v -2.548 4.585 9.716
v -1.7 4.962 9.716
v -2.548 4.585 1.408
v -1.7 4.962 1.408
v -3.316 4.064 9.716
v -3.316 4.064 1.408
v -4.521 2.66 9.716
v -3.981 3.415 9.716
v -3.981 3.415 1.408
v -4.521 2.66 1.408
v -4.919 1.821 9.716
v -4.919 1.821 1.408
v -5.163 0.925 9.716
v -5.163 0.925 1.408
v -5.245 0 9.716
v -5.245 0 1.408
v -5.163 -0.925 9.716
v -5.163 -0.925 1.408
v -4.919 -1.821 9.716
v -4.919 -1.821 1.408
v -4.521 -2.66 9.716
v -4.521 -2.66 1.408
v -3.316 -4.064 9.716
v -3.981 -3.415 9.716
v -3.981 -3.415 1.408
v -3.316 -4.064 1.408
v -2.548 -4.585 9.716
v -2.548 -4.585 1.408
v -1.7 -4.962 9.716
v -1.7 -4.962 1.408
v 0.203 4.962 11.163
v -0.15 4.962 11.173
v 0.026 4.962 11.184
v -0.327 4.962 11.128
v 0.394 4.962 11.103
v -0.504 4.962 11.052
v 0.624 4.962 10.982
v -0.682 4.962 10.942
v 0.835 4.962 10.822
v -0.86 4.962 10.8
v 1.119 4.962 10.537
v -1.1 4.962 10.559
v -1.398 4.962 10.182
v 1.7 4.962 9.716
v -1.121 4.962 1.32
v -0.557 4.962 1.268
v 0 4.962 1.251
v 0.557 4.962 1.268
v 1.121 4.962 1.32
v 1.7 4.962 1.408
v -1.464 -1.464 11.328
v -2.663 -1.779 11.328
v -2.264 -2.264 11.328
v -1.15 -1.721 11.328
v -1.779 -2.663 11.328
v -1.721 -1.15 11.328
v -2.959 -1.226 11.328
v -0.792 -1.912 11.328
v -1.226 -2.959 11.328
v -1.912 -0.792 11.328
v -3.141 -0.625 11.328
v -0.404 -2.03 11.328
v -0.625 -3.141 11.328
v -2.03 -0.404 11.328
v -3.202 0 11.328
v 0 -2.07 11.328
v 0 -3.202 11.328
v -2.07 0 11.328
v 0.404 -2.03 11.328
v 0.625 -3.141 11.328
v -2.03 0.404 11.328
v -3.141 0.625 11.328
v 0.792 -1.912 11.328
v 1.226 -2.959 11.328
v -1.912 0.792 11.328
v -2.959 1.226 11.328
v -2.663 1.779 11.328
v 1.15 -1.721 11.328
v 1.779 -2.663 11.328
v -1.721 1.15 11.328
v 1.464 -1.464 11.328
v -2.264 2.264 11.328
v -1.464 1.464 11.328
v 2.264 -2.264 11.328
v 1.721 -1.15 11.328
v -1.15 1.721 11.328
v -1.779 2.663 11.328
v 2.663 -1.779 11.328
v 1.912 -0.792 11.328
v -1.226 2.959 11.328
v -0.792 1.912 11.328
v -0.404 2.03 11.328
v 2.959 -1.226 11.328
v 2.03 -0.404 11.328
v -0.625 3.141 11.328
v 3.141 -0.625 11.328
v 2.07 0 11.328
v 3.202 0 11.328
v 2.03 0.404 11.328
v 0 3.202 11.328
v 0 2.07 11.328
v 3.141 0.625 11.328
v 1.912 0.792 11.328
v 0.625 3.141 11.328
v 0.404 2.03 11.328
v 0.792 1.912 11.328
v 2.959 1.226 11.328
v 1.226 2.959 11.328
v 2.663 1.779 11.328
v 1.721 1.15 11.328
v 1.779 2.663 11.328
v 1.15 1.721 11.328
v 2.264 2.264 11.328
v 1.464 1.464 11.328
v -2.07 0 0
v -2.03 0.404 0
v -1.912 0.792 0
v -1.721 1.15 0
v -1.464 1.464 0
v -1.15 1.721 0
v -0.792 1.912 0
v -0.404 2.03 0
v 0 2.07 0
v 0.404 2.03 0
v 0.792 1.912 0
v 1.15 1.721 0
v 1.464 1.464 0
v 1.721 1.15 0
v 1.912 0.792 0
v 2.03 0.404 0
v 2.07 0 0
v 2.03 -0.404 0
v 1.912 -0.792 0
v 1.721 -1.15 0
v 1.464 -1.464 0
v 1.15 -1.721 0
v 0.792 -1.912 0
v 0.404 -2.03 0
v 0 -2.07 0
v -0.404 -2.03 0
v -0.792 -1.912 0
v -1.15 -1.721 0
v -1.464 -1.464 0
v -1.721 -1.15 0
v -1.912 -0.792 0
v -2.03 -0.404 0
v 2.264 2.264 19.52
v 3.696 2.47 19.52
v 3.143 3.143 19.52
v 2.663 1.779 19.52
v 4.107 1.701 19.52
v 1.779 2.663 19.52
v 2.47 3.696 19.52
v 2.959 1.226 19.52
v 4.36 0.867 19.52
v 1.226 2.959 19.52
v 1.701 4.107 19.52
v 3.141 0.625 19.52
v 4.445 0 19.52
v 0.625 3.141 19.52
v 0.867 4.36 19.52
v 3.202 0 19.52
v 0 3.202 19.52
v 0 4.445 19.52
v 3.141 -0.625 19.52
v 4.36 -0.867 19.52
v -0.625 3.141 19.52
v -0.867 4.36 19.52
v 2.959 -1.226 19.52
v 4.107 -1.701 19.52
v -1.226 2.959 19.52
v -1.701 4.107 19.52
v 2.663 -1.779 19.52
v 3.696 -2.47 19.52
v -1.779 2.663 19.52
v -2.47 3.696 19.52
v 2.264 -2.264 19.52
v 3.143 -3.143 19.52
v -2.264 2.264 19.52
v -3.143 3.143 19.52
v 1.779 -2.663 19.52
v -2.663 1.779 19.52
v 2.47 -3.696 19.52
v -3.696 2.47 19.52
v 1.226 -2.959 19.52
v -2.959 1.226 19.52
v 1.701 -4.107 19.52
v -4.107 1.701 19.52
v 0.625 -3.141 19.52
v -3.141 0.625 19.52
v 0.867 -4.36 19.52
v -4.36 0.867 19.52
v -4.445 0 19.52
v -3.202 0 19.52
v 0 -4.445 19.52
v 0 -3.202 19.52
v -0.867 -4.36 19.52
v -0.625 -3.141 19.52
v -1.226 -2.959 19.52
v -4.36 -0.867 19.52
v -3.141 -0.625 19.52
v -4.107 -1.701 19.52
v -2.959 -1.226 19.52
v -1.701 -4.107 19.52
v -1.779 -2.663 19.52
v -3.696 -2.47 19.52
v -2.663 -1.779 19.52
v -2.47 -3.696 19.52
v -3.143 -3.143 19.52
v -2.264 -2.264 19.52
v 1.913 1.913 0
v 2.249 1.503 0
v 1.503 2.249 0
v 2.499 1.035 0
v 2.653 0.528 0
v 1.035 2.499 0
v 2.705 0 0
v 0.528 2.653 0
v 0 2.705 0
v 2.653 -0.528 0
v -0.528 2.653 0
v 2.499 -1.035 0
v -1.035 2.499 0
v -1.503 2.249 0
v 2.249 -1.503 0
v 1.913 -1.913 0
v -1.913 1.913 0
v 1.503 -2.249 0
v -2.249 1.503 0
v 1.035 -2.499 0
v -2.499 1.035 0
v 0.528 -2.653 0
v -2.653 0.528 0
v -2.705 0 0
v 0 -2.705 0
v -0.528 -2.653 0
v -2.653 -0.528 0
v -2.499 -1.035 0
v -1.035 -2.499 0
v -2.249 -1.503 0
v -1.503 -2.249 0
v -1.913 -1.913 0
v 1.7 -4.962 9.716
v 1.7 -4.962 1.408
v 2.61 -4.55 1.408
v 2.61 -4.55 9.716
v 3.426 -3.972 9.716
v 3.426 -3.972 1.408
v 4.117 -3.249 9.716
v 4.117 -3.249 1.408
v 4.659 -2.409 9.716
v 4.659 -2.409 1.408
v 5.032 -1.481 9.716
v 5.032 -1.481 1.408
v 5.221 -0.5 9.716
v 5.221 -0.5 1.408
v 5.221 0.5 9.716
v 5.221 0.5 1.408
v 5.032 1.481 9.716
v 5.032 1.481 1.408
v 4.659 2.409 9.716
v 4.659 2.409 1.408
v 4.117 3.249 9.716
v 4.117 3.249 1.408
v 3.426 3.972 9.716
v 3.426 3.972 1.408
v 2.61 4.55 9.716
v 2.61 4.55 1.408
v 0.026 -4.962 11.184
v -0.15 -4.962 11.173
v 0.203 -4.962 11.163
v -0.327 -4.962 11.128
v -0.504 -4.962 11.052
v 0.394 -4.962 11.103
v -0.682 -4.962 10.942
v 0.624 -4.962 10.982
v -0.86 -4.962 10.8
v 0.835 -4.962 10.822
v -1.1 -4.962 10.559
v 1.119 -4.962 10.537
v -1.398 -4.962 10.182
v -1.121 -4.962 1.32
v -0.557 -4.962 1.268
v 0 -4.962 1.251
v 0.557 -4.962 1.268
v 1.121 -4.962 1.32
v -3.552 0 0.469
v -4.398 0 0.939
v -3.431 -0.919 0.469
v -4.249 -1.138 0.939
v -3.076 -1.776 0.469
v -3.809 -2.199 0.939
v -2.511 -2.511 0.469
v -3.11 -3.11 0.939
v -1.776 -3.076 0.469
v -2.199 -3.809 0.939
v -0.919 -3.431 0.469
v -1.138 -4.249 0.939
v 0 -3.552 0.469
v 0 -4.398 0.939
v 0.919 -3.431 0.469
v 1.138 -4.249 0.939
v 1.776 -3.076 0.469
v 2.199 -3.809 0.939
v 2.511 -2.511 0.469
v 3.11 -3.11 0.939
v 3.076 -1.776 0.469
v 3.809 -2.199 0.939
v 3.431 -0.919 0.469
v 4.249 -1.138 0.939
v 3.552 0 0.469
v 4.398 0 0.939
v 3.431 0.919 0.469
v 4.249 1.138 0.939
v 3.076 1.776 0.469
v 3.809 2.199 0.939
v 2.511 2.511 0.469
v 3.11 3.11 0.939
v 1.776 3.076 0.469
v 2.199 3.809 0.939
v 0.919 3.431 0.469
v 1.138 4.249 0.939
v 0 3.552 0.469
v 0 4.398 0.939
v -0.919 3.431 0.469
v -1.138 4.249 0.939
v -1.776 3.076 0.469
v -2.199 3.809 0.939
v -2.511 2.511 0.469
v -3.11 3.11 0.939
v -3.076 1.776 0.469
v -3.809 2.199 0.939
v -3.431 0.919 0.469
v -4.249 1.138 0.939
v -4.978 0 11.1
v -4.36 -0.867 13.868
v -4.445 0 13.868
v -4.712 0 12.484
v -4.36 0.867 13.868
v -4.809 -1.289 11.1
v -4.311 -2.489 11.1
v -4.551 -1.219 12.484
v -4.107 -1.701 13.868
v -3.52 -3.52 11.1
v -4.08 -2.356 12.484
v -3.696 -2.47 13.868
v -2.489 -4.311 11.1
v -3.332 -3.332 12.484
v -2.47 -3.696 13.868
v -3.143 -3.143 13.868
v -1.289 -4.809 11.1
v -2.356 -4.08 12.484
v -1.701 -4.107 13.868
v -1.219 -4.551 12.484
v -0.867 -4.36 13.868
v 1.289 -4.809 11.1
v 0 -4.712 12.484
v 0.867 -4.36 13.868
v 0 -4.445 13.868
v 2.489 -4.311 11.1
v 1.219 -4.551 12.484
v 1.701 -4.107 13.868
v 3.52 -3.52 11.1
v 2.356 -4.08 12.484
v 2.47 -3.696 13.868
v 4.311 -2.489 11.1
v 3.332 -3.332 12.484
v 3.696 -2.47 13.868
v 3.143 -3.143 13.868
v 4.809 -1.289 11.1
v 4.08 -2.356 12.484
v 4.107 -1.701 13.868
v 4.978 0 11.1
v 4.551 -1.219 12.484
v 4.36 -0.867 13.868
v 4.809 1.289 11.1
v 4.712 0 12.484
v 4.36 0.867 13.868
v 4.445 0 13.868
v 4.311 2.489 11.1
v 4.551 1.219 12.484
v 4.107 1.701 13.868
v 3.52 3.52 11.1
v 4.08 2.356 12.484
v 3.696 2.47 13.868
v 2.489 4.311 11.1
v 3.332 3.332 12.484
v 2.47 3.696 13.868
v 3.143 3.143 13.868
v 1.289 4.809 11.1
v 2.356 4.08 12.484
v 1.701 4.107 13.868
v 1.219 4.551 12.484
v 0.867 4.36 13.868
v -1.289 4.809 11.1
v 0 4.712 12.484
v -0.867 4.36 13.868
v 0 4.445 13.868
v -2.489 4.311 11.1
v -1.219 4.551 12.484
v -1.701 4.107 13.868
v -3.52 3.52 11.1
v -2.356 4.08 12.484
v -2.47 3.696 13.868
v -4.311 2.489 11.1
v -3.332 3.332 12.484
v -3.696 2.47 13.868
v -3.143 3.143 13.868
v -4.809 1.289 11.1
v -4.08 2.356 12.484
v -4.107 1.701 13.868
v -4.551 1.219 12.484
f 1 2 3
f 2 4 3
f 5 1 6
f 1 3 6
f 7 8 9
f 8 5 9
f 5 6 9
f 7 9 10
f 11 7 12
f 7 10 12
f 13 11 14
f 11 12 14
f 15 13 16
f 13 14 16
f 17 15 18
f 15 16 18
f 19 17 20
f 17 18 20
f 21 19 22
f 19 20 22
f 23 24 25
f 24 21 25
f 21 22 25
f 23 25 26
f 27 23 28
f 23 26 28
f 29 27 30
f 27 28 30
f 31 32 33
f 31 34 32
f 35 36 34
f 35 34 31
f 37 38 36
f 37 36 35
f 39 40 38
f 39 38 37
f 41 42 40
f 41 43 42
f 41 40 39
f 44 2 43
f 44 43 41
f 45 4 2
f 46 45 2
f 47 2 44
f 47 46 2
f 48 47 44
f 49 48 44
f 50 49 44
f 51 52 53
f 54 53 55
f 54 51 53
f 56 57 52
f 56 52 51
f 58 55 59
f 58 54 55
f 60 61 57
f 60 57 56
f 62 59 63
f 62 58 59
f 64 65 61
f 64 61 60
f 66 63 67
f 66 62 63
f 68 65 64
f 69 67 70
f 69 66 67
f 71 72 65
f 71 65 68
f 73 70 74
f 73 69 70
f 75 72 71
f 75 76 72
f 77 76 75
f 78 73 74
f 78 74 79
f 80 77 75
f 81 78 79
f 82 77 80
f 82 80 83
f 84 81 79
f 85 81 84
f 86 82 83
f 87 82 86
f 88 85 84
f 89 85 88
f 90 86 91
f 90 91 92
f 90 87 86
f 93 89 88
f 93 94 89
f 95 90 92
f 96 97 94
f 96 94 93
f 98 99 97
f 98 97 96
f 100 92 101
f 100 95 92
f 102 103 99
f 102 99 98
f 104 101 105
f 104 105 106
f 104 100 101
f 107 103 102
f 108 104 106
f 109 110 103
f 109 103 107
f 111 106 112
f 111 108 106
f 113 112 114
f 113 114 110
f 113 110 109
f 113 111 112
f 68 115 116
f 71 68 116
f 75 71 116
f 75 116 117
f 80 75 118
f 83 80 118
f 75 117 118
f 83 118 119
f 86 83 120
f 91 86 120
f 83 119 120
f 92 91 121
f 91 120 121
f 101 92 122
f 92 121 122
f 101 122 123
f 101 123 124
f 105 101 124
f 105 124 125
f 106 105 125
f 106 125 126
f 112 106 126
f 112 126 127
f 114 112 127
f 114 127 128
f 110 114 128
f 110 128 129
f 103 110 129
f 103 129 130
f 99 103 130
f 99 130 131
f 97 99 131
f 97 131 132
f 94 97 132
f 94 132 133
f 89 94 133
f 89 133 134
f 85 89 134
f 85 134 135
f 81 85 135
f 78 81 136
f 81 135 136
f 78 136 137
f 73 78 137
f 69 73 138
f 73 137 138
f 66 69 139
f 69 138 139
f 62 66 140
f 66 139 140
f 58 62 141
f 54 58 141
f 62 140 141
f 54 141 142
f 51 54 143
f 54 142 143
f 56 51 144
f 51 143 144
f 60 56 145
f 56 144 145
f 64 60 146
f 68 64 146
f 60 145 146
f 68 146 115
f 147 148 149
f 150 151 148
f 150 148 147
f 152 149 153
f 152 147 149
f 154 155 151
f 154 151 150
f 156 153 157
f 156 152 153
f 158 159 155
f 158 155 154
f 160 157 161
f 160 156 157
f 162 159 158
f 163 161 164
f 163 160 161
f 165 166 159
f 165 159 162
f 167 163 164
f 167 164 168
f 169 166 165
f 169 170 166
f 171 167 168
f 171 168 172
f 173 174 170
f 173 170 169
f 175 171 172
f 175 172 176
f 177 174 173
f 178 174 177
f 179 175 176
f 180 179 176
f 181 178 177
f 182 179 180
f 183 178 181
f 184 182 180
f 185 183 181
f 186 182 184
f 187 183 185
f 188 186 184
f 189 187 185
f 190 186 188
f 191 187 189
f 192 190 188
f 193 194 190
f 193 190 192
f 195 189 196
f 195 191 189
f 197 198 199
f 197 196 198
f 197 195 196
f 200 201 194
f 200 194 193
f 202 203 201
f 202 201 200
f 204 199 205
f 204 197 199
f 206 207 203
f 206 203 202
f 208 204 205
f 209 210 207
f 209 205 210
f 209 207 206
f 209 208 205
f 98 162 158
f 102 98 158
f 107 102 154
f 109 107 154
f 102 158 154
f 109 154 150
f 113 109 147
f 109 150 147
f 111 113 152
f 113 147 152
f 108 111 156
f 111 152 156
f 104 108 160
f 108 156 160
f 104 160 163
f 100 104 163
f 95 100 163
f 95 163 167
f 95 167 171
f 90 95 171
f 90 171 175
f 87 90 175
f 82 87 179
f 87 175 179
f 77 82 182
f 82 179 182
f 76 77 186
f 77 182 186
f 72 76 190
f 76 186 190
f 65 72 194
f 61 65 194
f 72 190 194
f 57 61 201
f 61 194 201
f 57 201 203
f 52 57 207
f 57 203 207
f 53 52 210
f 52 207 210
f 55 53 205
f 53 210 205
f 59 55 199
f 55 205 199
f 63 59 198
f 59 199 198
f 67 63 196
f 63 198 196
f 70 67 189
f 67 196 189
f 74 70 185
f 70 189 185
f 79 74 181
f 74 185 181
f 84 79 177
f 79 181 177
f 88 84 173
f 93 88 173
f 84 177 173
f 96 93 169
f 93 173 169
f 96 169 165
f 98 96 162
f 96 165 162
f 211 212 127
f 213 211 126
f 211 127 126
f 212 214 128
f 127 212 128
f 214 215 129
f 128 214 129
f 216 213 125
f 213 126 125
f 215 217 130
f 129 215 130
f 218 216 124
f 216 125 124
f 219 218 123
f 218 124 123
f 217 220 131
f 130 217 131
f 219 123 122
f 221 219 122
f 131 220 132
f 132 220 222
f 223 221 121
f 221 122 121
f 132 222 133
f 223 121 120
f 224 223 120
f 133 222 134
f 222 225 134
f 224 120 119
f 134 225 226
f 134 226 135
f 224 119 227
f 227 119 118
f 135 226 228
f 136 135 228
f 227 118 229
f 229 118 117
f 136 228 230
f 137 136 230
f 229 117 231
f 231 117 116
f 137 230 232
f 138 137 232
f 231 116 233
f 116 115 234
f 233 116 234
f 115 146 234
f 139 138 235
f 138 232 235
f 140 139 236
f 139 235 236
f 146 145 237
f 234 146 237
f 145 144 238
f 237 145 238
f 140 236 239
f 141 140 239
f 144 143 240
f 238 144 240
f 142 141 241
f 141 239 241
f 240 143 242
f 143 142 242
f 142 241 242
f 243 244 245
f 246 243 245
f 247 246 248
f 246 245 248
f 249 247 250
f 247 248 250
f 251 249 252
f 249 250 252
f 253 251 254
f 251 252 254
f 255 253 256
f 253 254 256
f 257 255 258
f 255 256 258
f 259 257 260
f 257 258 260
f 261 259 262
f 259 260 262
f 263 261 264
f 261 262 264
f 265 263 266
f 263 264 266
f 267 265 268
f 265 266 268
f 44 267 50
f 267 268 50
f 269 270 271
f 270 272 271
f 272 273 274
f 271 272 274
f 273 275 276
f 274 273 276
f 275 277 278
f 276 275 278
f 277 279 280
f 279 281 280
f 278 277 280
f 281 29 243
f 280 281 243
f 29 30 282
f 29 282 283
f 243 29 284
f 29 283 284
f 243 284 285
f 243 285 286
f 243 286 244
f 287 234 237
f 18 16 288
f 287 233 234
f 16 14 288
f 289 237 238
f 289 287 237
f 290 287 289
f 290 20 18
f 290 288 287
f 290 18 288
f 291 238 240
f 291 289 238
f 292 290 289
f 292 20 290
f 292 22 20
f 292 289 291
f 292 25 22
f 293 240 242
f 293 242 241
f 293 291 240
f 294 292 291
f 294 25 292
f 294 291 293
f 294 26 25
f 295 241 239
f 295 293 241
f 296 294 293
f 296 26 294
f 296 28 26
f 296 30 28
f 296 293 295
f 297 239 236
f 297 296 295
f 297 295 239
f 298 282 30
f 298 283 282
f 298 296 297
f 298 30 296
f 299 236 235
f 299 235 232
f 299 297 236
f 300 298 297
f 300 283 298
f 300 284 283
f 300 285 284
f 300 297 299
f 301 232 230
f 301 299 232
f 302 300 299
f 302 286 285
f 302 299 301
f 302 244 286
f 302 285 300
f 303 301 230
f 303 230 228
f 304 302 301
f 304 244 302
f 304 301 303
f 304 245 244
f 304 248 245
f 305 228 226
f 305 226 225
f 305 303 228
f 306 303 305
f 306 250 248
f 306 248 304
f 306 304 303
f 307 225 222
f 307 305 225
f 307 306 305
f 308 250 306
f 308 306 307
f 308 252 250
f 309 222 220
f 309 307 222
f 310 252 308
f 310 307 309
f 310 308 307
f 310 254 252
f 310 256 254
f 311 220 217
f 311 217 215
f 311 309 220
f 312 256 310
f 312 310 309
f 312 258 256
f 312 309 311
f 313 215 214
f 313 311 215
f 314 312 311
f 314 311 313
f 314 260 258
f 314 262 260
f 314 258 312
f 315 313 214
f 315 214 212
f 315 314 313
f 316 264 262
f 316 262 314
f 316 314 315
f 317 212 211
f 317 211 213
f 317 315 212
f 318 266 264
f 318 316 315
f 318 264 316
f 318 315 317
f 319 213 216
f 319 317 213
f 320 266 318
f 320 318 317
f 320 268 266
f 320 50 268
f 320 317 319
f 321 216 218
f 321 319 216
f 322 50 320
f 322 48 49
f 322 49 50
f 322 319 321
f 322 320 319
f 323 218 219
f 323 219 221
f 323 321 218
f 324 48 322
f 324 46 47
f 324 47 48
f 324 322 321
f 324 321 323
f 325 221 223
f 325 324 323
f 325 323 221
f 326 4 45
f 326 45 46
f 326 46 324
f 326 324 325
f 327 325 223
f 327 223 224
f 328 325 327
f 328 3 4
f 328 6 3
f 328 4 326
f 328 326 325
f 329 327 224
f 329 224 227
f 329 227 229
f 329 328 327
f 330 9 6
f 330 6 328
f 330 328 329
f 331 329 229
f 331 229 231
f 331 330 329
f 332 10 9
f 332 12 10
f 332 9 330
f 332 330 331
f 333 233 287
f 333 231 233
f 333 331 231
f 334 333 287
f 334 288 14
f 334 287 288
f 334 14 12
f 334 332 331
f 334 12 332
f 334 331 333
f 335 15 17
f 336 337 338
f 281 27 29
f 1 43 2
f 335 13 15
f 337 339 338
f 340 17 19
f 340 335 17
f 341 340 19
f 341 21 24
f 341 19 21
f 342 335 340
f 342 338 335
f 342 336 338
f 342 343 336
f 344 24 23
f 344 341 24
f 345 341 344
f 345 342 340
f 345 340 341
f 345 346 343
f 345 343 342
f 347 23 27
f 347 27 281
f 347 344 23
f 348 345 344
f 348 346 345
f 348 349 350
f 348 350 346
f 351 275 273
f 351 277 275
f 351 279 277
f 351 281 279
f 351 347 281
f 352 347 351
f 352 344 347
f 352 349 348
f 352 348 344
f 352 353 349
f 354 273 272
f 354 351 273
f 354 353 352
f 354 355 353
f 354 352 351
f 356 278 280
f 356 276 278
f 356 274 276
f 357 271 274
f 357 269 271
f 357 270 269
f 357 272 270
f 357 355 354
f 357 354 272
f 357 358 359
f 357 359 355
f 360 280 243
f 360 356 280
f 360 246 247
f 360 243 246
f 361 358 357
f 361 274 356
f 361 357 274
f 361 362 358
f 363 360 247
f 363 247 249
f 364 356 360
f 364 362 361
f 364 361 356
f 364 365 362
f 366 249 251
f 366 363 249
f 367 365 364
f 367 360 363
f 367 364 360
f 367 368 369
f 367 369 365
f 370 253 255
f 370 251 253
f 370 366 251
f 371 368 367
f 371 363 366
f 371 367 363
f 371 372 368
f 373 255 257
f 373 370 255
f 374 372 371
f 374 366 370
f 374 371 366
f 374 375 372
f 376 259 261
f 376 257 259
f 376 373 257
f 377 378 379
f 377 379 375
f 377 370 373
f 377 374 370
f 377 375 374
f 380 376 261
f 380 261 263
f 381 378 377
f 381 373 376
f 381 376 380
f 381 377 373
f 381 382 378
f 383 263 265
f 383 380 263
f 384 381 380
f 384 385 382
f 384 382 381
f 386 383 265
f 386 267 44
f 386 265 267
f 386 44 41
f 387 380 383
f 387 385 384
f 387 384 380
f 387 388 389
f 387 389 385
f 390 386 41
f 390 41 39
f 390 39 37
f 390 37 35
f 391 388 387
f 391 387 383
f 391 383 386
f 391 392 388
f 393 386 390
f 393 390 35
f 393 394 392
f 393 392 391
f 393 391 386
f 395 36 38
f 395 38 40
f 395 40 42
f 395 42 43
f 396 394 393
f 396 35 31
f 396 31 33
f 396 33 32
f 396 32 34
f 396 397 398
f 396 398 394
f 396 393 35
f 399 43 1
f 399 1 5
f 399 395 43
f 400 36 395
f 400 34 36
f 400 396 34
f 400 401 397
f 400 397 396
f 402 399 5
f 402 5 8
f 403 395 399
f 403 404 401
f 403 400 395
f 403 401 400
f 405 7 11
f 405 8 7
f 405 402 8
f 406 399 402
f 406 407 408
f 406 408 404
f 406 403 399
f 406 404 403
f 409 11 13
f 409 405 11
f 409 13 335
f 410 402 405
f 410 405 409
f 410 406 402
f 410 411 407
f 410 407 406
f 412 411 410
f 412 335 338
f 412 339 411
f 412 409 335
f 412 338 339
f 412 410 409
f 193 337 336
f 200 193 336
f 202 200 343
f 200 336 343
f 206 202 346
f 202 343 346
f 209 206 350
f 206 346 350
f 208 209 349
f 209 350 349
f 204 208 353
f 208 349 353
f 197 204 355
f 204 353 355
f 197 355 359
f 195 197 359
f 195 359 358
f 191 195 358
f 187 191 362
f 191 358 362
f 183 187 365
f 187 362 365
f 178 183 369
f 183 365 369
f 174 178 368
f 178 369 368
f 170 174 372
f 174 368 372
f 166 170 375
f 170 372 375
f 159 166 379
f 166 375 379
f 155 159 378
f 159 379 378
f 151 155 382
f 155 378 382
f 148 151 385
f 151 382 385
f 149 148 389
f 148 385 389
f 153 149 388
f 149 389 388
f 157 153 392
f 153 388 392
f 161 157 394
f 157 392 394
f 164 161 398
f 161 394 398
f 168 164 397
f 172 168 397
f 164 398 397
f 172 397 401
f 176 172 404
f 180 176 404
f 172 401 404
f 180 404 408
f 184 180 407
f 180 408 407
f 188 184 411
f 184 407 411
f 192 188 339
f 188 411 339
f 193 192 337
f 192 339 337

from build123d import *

# Parameters (mm, degrees)
SKETCH1_R           = 5.2451
BOSS_EXTRUDE1_DEPTH = 9.7155
CHAMFER1_SIZE       = 2.54
CHAMFER1_SIZE2      = 1.407944991
SKETCH2_R           = 4.445
SKETCH3_R           = 4.445
BOSS_EXTRUDE2_DEPTH = 5.6515
SKETCH4_R           = 2.069853247
CUT_EXTRUDE1_DEPTH  = 13.7795
SKETCH5_OUTSIDE_W   = 17.394
SKETCH5_OUTSIDE_H   = 17.394
SKETCH5_OUTSIDE_W_2 = 15.169695532
SKETCH5_OUTSIDE_H_2 = 9.924235678
CUT_EXTRUDE2_DEPTH  = 11.7475
SKETCH6_R           = 3.20242673
CUT_EXTRUDE3_DEPTH  = 8.1915


with BuildPart() as part:
    # Sketch1 → Boss-Extrude1 (new body)
    with BuildSketch(Plane.XY):
        with Locations(Location((0, 0, 0), (0, 0, 180))):
            Circle(SKETCH1_R)
    extrude(amount=BOSS_EXTRUDE1_DEPTH)

    # Chamfer1
    chamfer1_edges = [part.edges().sort_by_distance(p)[0] for p in [
        (5.2451, 0, 0),
    ]]
    chamfer1_side = [part.faces().sort_by_distance(p)[0] for p in [
        (0, 0, 0),
    ]]
    chamfer(chamfer1_edges, length=CHAMFER1_SIZE, length2=CHAMFER1_SIZE2, reference=chamfer1_side[0])

    # Sketch2 → section 1 of loft1
    with BuildSketch(Plane.XY.offset(13.8684), mode=Mode.PRIVATE) as loft1_s1:
        Circle(SKETCH2_R)
    # loft up to a face of the part (loft1)
    loft([Face(Wire([part.edges().sort_by_distance((3.590518025, -3.823513348, 9.7155))[0]])), loft1_s1.sketch])

    # Sketch3 → Boss-Extrude2 (add)
    with BuildSketch(Plane.XY.offset(13.8684)):
        with Locations(Location((0, 0, 0), (0, 0, 180))):
            Circle(SKETCH3_R)
    extrude(amount=BOSS_EXTRUDE2_DEPTH)

    # Sketch4 → Cut-Extrude1 (cut)
    with BuildSketch(Plane(origin=(0, 0, 0), x_dir=(-1, 0, 0), z_dir=(0, 0, -1))):
        Circle(SKETCH4_R)
    extrude(amount=-CUT_EXTRUDE1_DEPTH, mode=Mode.SUBTRACT)

    # Sketch5 outside → Cut-Extrude2 (cut)
    with BuildSketch(Plane.XY):
        Rectangle(SKETCH5_OUTSIDE_W, SKETCH5_OUTSIDE_H)
        with Locations((-0.203425036, 0)):
            Rectangle(SKETCH5_OUTSIDE_W_2, SKETCH5_OUTSIDE_H_2, mode=Mode.SUBTRACT)
    extrude(amount=CUT_EXTRUDE2_DEPTH, mode=Mode.SUBTRACT)

    # Sketch6 → Cut-Extrude3 (cut)
    with BuildSketch(Plane.XY.offset(19.5199)):
        Circle(SKETCH6_R)
    extrude(amount=-CUT_EXTRUDE3_DEPTH, mode=Mode.SUBTRACT)


solid = part.part
